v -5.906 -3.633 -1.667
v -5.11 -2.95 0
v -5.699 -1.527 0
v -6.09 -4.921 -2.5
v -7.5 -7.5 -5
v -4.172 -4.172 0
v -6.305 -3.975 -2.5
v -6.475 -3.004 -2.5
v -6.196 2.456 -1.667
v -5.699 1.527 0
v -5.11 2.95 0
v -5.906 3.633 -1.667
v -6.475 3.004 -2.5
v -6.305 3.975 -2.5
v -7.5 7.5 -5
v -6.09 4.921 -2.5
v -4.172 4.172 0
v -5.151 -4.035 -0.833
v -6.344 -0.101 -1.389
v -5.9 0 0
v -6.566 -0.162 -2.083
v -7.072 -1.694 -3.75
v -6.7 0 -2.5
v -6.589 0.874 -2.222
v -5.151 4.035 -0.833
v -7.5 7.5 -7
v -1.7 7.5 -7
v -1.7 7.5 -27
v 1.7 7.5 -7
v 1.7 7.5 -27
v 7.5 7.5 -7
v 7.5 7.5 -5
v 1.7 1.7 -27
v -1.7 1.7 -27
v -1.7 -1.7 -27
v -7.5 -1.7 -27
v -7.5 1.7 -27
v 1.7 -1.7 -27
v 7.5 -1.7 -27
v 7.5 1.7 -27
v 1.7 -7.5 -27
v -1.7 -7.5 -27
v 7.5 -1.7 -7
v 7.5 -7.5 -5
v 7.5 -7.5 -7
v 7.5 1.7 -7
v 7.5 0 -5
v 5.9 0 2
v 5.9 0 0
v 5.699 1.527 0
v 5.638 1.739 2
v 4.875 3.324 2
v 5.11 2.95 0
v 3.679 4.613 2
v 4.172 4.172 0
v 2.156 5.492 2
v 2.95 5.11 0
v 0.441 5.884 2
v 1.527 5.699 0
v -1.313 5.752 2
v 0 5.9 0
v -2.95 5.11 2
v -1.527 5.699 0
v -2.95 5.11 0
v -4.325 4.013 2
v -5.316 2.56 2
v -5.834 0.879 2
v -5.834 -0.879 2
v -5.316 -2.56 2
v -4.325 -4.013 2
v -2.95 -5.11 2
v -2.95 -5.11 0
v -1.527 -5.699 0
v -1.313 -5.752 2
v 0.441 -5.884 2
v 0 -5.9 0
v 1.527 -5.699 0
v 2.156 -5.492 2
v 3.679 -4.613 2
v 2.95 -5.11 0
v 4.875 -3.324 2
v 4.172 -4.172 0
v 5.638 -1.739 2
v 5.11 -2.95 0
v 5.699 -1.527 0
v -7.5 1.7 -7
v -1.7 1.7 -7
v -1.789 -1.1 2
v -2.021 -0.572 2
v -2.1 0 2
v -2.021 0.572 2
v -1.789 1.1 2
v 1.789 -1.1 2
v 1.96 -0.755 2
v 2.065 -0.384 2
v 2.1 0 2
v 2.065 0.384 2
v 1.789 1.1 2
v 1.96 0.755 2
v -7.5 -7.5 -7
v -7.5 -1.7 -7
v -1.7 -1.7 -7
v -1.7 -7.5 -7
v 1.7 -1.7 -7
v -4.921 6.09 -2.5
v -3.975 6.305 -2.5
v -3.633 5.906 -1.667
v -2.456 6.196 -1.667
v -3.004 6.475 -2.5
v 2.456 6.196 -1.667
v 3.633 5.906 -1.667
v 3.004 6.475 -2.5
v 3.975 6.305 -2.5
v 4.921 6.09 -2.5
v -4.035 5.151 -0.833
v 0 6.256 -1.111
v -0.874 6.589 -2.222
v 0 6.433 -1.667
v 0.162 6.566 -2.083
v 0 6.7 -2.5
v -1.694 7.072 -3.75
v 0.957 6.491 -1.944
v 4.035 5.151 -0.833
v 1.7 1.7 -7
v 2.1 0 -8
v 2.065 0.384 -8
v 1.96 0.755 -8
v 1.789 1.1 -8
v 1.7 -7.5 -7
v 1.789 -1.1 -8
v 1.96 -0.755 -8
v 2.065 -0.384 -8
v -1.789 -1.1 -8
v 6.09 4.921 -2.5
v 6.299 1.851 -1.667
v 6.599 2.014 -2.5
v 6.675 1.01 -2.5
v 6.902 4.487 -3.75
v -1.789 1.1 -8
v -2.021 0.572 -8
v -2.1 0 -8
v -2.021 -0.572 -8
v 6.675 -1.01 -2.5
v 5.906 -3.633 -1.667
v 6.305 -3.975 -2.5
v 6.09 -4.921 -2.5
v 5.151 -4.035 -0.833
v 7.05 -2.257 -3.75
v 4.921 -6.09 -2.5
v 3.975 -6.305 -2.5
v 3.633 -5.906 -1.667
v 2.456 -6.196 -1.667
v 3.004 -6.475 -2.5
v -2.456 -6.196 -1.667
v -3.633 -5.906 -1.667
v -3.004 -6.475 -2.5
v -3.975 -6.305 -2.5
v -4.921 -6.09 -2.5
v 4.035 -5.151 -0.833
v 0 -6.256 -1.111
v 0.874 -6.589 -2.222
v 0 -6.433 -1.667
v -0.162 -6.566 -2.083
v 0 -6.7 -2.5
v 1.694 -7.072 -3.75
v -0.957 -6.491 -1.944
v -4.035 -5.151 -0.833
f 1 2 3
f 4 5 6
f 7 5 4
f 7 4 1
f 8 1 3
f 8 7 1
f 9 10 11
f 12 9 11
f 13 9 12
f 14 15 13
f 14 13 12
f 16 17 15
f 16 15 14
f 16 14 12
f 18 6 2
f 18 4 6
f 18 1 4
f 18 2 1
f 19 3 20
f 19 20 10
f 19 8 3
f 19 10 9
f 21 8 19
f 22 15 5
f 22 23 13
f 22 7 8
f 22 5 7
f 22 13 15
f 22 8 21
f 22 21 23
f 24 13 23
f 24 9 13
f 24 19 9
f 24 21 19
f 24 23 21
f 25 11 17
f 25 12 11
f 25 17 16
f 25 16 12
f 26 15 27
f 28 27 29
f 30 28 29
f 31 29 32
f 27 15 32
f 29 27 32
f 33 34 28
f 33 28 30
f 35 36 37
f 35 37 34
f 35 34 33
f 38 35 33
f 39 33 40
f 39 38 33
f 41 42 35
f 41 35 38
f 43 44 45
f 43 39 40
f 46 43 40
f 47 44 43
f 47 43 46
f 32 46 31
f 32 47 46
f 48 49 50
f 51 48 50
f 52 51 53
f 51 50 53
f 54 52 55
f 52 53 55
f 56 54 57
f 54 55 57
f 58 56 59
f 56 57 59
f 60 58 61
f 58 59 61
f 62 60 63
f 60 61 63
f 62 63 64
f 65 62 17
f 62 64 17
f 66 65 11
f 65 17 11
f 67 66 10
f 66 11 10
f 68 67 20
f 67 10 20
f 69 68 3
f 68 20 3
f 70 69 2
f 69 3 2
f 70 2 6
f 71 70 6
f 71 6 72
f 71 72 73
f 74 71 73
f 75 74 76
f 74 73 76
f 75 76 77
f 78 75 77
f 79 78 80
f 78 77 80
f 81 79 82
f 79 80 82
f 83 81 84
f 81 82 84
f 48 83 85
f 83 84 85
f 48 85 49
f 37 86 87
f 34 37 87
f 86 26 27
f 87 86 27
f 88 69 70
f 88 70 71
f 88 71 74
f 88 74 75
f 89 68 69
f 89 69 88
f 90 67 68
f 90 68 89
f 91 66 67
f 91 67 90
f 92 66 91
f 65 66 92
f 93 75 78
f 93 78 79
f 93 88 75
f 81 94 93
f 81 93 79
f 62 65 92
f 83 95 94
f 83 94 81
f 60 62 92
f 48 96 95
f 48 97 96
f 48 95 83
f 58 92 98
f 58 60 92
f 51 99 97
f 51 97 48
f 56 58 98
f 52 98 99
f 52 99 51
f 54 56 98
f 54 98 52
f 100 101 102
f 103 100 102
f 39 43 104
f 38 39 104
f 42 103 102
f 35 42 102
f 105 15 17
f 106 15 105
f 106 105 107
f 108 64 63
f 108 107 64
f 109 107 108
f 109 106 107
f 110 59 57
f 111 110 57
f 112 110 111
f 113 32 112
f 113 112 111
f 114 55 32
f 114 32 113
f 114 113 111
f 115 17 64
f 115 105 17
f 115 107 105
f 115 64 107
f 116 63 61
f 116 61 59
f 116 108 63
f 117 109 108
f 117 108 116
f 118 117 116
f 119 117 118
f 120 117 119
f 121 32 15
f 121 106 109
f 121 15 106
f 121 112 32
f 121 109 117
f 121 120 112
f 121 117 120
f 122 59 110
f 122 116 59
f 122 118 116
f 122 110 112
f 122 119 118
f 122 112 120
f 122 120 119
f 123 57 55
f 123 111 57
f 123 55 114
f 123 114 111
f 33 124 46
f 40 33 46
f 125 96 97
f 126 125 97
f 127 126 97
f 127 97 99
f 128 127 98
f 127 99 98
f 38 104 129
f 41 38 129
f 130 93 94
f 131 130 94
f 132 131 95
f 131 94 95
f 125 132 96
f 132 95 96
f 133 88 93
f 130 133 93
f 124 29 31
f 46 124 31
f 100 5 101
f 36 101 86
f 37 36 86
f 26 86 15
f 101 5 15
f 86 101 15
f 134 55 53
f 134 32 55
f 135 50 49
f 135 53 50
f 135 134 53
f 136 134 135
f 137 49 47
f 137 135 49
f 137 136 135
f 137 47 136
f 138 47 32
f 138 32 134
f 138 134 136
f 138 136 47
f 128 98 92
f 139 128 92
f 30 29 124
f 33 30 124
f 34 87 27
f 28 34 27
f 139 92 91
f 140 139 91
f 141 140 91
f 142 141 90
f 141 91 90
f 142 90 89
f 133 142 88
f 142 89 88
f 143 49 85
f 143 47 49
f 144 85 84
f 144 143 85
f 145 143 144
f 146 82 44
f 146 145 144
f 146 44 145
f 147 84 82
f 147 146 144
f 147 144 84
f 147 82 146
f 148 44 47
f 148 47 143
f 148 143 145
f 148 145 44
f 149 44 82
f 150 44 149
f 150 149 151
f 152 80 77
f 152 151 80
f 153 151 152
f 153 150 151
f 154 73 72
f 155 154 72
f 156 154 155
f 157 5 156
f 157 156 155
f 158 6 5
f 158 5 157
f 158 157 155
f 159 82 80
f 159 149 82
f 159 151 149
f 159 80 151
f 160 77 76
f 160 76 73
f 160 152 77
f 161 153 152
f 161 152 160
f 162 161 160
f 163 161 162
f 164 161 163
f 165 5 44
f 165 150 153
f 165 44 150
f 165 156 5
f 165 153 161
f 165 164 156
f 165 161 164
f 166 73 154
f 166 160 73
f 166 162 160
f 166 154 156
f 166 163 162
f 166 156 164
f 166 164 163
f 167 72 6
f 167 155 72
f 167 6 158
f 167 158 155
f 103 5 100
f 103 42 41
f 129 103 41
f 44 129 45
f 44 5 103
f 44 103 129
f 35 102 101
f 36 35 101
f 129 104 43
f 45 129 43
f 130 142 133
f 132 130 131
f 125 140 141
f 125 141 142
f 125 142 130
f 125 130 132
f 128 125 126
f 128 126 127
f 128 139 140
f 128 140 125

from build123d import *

# Parameters (mm, degrees)
F0_R      = 3.9
F0_R_2    = 2.4
F1_DEPTH  = 2
F0_R_3    = 5.9
F2_DEPTH  = 2
F4_W      = 15
F4_H      = 15
F5_DEPTH  = 2
F2_FACE_R = 5.9
F5_FACE_W = 15
F5_FACE_H = 15
F8_DEPTH  = 20
F10_DEPTH = 10


with BuildPart() as f1:
    # F0 (on Top) → F1 (new body)
    with BuildSketch(Plane.XY):
        Circle(F0_R)
        Circle(F0_R_2, mode=Mode.SUBTRACT)
        Circle(F0_R_2)
    extrude(amount=F1_DEPTH)

    # F0 (on Top) → F2 (join)
    with BuildSketch(Plane.XY):
        Circle(F0_R_3)
        Circle(F0_R, mode=Mode.SUBTRACT)
    extrude(amount=F2_DEPTH)



with BuildPart() as f5:
    # F4 (on offset) → F5 (new body)
    with BuildSketch(Plane.XY.offset(-5)):
        Rectangle(F4_W, F4_H)
    extrude(amount=-F5_DEPTH)


with BuildPart() as f1_1:
    add(f1.part)

    add(f5.part)  # F6 merges F5
    # F2_face (on face) → F6 section 0
    with BuildSketch(Plane(origin=(0, 0, 0), x_dir=(1, 0, 0), z_dir=(0, 0, -1))):
        Circle(F2_FACE_R)
    # F5_face (on face) → F6 section 1
    with BuildSketch(Plane.XY.offset(-5)):
        Rectangle(F5_FACE_W, F5_FACE_H)
    loft()

    # F7 (on face) → F8 (join)
    with BuildSketch(Plane(origin=(0, 0, -7), x_dir=(1, 0, 0), z_dir=(0, 0, -1))):
        Polygon((-7.5, 1.7), (-7.5, -1.7), (-1.7, -1.7), (-1.7, -7.5), (1.7, -7.5), (1.7, -1.7), (7.5, -1.7), (7.5, 1.7), (1.7, 1.7), (1.7, 7.5), (-1.7, 7.5), (-1.7, 1.7), align=None)
    extrude(amount=F8_DEPTH)

    # F9 (on face) → F10 (cut)
    with BuildSketch(Plane.XY.offset(2)):
        with BuildLine():
            ThreePointArc((1.788854382, -1.1), (2.020716977, -0.5715793024), (2.1, 0))
            ThreePointArc((2.1, 0), (2.020716977, 0.5715793024), (1.788854382, 1.1))
            Line((1.788854382, 1.1), (-1.788854382, 1.1))
            ThreePointArc((-1.788854382, 1.1), (-2.1, 0), (-1.788854382, -1.1))
            Line((-1.788854382, -1.1), (1.788854382, -1.1))
        make_face()
    extrude(amount=-F10_DEPTH, mode=Mode.SUBTRACT)


solid = f1_1.part
